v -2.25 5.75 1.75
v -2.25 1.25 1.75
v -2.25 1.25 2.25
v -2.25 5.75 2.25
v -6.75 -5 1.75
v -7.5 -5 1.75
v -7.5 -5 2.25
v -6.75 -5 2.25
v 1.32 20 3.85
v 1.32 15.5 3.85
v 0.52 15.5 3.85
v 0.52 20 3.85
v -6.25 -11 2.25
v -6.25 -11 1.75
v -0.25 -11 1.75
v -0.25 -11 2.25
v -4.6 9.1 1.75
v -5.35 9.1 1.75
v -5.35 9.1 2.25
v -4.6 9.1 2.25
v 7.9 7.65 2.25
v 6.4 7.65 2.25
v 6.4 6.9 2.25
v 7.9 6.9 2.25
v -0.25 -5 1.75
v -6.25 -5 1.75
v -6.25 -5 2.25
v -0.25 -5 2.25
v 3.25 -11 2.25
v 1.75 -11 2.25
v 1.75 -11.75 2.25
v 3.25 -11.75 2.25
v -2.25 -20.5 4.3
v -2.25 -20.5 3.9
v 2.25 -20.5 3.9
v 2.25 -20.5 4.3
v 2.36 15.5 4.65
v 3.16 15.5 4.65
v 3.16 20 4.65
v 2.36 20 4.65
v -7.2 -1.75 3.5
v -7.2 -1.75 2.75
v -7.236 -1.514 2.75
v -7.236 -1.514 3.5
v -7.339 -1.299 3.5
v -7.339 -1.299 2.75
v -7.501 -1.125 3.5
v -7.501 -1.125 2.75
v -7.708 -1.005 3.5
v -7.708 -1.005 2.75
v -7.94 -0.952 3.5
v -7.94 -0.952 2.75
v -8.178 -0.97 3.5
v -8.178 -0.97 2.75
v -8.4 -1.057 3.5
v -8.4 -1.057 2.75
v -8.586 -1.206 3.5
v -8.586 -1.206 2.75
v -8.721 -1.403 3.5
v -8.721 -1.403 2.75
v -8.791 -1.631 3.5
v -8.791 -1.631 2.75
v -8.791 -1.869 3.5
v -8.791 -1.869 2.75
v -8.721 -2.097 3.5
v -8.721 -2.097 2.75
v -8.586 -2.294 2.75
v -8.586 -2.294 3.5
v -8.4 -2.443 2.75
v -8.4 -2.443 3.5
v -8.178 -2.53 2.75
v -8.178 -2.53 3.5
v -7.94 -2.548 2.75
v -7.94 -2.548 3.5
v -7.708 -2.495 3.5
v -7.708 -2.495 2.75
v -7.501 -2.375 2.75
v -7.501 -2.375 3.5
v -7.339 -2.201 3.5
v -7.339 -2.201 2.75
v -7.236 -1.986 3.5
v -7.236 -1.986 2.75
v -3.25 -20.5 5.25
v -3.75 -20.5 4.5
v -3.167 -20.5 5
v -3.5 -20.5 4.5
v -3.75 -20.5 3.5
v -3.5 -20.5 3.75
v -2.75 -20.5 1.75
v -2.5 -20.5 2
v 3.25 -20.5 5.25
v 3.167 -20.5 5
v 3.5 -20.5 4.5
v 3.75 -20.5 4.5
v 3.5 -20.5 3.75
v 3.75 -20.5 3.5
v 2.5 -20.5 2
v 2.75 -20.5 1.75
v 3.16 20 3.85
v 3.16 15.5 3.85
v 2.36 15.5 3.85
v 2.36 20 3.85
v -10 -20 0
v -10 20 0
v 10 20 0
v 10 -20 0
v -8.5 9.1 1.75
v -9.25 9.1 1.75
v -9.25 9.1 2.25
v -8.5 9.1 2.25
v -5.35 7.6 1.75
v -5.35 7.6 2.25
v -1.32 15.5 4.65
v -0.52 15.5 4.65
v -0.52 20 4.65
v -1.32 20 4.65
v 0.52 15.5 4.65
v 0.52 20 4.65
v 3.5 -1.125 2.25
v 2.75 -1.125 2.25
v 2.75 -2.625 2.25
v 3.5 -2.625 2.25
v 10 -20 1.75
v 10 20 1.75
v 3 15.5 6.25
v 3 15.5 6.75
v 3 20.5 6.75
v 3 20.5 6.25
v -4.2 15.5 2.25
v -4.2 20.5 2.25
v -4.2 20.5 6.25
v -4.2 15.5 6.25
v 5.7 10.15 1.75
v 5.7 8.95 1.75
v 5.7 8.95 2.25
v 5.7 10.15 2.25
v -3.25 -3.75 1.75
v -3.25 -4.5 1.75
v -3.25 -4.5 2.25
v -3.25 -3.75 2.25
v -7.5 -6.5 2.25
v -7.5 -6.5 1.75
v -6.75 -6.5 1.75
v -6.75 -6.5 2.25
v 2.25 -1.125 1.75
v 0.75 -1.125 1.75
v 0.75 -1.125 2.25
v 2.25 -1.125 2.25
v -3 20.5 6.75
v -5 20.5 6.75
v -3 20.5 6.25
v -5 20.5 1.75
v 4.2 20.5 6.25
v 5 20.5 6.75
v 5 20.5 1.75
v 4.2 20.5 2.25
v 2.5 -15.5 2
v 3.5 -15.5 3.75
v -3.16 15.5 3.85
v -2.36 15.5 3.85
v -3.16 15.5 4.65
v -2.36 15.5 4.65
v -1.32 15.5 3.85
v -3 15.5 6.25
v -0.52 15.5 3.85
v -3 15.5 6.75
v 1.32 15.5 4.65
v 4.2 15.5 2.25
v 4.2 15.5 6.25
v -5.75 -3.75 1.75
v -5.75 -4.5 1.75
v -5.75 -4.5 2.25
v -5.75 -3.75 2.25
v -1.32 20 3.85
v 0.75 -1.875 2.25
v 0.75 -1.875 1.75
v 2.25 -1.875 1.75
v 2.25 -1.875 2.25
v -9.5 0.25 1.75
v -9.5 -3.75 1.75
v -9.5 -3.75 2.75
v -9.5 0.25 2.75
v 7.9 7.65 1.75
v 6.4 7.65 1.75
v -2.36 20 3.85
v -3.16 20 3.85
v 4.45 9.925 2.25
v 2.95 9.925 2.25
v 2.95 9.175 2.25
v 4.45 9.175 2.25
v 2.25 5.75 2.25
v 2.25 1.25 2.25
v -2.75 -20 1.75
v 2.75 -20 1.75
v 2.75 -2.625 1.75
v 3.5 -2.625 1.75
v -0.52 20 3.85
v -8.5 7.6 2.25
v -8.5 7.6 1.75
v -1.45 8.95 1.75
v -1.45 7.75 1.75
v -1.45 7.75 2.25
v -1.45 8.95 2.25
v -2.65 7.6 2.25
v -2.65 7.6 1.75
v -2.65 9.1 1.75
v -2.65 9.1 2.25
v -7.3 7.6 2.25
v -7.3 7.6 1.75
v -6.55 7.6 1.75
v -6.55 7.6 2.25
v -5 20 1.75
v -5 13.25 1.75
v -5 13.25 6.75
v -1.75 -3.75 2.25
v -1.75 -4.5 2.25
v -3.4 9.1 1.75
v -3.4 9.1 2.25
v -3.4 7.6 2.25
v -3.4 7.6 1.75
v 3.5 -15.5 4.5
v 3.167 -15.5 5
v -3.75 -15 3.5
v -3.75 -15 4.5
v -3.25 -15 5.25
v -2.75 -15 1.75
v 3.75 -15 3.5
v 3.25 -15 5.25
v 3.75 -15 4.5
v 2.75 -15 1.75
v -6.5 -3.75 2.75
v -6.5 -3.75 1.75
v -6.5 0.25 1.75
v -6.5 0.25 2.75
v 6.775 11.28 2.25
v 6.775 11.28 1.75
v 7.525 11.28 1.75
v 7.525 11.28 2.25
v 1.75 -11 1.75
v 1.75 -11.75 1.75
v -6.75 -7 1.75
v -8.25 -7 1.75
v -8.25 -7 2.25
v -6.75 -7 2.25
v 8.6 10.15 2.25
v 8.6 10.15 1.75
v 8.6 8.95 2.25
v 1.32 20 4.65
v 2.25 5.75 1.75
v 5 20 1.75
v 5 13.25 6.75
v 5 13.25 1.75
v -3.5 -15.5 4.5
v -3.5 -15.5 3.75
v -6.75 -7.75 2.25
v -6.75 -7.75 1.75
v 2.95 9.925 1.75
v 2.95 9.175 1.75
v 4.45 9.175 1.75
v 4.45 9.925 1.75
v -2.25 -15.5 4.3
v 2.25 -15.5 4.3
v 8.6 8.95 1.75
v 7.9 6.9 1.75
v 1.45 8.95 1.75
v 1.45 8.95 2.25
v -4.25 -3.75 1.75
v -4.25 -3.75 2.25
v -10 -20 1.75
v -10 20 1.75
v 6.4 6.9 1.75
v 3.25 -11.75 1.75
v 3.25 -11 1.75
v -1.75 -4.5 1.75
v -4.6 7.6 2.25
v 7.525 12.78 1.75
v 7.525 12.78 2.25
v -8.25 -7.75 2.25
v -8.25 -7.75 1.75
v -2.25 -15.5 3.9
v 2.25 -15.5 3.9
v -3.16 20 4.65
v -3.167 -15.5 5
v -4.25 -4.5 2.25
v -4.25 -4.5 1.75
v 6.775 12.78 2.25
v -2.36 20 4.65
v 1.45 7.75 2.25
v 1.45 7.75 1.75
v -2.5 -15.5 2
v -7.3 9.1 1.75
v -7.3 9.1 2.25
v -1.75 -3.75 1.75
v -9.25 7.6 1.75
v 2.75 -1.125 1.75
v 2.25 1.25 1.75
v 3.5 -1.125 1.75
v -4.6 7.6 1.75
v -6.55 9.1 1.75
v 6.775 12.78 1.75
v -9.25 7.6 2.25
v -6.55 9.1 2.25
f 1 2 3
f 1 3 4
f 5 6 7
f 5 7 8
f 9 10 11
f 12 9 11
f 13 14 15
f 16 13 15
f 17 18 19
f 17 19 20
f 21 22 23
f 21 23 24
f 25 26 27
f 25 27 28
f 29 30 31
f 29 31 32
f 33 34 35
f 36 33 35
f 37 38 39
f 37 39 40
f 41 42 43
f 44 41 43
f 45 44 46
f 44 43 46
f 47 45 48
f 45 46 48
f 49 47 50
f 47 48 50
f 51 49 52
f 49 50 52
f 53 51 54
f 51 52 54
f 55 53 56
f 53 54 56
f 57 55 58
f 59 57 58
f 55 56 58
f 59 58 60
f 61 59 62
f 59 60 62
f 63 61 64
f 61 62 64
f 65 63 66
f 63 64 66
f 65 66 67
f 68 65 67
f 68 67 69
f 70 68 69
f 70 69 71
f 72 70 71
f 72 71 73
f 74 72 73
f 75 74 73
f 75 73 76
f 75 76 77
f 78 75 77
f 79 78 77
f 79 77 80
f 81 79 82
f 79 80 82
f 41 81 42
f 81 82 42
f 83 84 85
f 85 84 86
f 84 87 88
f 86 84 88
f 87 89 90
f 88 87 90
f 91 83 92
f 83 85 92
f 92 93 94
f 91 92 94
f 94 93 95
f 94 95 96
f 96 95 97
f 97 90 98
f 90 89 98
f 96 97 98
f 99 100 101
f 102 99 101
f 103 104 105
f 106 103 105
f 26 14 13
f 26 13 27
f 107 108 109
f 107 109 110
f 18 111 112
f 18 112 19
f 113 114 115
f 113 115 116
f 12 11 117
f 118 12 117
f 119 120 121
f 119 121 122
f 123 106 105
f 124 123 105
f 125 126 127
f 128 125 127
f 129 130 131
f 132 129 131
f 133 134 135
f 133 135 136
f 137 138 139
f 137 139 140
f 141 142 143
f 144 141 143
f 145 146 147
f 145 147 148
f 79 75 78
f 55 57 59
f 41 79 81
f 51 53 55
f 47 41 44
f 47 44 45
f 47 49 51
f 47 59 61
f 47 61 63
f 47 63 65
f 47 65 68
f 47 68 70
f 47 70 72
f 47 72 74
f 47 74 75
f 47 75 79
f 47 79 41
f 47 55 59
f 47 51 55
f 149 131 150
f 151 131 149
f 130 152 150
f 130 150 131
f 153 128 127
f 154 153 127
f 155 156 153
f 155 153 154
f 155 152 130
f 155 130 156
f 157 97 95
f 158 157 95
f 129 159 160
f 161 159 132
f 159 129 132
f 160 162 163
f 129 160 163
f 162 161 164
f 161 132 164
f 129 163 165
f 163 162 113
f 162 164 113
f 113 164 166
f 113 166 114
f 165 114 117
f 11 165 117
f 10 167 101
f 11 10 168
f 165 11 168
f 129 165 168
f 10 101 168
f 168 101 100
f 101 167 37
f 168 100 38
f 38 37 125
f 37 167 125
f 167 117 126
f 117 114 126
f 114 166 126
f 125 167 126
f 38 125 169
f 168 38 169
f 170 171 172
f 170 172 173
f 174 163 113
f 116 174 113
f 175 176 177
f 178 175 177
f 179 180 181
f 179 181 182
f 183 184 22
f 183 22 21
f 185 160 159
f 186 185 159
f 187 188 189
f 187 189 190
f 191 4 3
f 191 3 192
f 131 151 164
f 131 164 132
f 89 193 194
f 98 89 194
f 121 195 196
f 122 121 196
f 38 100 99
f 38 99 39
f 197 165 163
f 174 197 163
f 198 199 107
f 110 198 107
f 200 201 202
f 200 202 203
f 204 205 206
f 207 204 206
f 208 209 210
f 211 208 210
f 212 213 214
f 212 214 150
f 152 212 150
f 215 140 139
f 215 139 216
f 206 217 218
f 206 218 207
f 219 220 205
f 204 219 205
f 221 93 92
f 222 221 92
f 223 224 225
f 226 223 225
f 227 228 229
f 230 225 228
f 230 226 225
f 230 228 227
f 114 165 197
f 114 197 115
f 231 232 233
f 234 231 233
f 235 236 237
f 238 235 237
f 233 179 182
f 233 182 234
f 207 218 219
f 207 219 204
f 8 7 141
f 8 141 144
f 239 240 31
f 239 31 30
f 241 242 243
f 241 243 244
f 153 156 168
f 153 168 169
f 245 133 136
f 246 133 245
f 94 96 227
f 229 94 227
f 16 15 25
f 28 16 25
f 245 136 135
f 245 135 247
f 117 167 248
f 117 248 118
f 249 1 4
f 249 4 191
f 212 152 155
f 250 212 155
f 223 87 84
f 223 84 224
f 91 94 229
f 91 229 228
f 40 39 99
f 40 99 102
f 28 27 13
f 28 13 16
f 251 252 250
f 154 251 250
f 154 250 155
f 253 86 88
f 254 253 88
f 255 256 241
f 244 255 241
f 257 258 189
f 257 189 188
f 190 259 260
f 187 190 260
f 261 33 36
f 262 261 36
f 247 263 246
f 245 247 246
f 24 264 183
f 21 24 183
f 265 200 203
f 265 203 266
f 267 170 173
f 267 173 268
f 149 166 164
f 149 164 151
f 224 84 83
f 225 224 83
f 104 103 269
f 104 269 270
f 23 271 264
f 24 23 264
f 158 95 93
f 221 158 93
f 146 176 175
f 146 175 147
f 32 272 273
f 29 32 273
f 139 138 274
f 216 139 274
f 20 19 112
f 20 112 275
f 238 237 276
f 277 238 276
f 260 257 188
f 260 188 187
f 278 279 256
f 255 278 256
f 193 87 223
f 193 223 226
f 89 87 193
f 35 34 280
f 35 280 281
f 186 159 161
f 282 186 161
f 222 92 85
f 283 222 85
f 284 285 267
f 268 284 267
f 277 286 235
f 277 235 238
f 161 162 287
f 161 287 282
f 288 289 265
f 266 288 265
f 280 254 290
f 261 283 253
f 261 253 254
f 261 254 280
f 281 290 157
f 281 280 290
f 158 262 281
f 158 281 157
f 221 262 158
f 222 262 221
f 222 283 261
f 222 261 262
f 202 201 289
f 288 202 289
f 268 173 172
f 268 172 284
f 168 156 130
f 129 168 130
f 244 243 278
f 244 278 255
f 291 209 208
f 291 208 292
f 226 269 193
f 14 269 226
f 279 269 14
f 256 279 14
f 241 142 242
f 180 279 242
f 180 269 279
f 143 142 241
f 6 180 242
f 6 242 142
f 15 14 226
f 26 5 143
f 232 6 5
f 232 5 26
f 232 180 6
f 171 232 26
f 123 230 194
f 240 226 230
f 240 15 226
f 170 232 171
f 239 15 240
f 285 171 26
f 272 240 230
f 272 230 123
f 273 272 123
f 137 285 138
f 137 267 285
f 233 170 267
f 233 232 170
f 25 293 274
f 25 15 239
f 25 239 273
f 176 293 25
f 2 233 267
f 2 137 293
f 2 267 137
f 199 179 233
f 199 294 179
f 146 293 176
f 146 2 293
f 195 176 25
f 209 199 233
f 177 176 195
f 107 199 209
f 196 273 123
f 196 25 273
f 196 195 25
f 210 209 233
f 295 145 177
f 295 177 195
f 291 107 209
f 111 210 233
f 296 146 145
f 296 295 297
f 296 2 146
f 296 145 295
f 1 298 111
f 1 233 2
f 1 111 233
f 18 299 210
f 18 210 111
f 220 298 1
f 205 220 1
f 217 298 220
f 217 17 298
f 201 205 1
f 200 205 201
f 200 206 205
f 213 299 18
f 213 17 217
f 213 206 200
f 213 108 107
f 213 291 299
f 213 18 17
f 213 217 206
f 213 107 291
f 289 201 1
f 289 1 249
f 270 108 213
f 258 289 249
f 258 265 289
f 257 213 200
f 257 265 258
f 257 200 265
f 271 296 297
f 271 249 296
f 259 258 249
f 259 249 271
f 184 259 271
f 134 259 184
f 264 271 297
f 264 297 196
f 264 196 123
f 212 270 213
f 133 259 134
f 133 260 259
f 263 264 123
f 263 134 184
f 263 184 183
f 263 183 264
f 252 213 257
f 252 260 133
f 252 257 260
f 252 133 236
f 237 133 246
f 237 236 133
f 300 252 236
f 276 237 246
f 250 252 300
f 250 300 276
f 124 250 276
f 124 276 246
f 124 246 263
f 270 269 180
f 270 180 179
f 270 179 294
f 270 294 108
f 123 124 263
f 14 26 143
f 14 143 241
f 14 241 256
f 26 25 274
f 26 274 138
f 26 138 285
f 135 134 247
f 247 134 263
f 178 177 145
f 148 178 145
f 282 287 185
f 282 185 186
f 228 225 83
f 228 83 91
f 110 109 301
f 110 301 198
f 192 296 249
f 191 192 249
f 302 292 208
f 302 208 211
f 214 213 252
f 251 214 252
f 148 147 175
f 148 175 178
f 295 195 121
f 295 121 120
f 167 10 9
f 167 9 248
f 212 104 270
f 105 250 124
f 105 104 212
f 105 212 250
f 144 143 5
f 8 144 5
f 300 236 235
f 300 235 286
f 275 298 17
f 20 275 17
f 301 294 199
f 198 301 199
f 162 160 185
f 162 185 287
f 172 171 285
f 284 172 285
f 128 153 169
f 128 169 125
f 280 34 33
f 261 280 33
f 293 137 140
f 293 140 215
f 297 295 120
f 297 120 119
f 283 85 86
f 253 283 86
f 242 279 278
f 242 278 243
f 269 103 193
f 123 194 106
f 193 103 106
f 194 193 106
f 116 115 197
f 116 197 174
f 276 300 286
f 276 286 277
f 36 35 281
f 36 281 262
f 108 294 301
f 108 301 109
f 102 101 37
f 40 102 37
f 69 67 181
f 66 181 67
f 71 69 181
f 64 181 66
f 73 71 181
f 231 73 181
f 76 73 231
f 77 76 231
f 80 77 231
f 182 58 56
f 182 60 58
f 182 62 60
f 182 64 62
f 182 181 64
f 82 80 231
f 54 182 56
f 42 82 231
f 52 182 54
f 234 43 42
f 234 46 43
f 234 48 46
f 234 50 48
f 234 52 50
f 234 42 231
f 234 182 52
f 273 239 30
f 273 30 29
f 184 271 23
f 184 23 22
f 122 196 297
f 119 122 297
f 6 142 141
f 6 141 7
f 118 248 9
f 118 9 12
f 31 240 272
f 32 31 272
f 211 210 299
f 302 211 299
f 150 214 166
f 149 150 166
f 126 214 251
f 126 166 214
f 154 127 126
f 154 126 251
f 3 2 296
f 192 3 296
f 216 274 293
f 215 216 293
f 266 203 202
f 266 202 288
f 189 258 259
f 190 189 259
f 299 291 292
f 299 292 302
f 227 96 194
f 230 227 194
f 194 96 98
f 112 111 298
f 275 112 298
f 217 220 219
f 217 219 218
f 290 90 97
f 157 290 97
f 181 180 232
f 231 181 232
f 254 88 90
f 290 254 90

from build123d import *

# Parameters (mm, degrees)
SKETCH_W        = 20
SKETCH_H        = 40
PAD_DEPTH       = 1.75
SKETCH001_W     = 7.5
SKETCH001_H     = 5.5
PAD001_DEPTH    = 3.5
POCKET_DEPTH    = 5.5
SKETCH003_W     = 4.5
SKETCH003_H     = 0.4
POCKET001_DEPTH = 5
SKETCH004_W     = 10
SKETCH004_H     = 7.25
PAD002_DEPTH    = 5
SKETCH005_W     = 8.4
SKETCH005_H     = 4
POCKET002_DEPTH = 5
SKETCH006_W     = 0.8
SKETCH006_H     = 0.8
PAD003_DEPTH    = 4.5
SKETCH007_W     = 6
SKETCH007_H     = 6
SKETCH007_W_2   = 4.5
SKETCH007_H_2   = 4.5
SKETCH007_W_3   = 0.75
SKETCH007_H_3   = 1.5
SKETCH007_W_4   = 2.9
SKETCH007_H_4   = 1.2
SKETCH007_W_5   = 1.5
SKETCH007_H_5   = 0.75
PAD004_DEPTH    = 0.5
SKETCH008_W     = 3
SKETCH008_H     = 4
PAD005_DEPTH    = 1
SKETCH009_R     = 0.8
PAD006_DEPTH    = 0.75
SKETCH010_W     = 6
SKETCH010_H     = 5
POCKET003_DEPTH = 0.5


with BuildPart() as part:
    # Sketch → Pad (new body)
    with BuildSketch(Plane.XY):
        Rectangle(SKETCH_W, SKETCH_H)
    extrude(amount=PAD_DEPTH)

    # Sketch001 (on Face6 of Pad) → Pad001 (join)
    with BuildSketch(Plane.XY.offset(1.75)):
        with Locations((0, -17.75)):
            Rectangle(SKETCH001_W, SKETCH001_H)
    extrude(amount=PAD001_DEPTH)

    # Sketch002 (on Face11 of Pad001) → Pocket (cut)
    with BuildSketch(Plane.XZ.offset(20.5)):
        Polygon((-3.75, 5.25), (-3.75, 4.5), (-3.25, 5.25), align=None)
        Polygon((-3.75, 1.75), (-3.75, 3.5), (-2.75, 1.75), align=None)
    pocket = extrude(amount=-POCKET_DEPTH, mode=Mode.SUBTRACT)

    # Mirrored: Pocket across YZ
    add(pocket.mirror(Plane.YZ), mode=Mode.SUBTRACT)

    # Sketch003 (on Face10 of Mirrored) → Pocket001 (cut)
    with BuildSketch(Plane.XZ.offset(20.5)):
        Polygon((-3.166667, 5), (-3.5, 4.5), (-3.5, 3.75), (-2.5, 2), (2.5, 2), (3.5, 3.75), (3.5, 4.5), (3.166667, 5), align=None)
        with Locations((0, 4.1)):
            Rectangle(SKETCH003_W, SKETCH003_H, mode=Mode.SUBTRACT)
    extrude(amount=-POCKET001_DEPTH, mode=Mode.SUBTRACT)

    # Sketch004 (on Face5 of Pocket001) → Pad002 (join)
    with BuildSketch(Plane.XY.offset(1.75)):
        with Locations((0, 16.875)):
            Rectangle(SKETCH004_W, SKETCH004_H)
    extrude(amount=PAD002_DEPTH)

    # Sketch005 (on Face15 of Pad002) → Pocket002 (cut)
    with BuildSketch(Plane(origin=(0, 20.5, 0), x_dir=(-1, 0, 0), z_dir=(0, 1, 0))):
        with Locations((0, 4.25)):
            Rectangle(SKETCH005_W, SKETCH005_H)
    extrude(amount=-POCKET002_DEPTH, mode=Mode.SUBTRACT)

    # Sketch006 (on Face35 of Pocket002) → Pad003 (join)
    with BuildSketch(Plane(origin=(0, 15.5, 0), x_dir=(-1, 0, 0), z_dir=(0, 1, 0))):
        with Locations((-2.76, 4.25)):
            Rectangle(SKETCH006_W, SKETCH006_H)
        with Locations((-0.92, 4.25)):
            Rectangle(SKETCH006_W, SKETCH006_H)
        with Locations((0.92, 4.25)):
            Rectangle(SKETCH006_W, SKETCH006_H)
        with Locations((2.76, 4.25)):
            Rectangle(SKETCH006_W, SKETCH006_H)
    extrude(amount=PAD003_DEPTH)

    # Sketch007 (on Face5 of Pad003) → Pad004 (join)
    with BuildSketch(Plane.XY.offset(1.75)):
        with Locations((-3.25, -8)):
            Rectangle(SKETCH007_W, SKETCH007_H)
        with Locations((0, 3.5)):
            Rectangle(SKETCH007_W_2, SKETCH007_H_2)
        with Locations((-8.875, 8.35)):
            Rectangle(SKETCH007_W_3, SKETCH007_H_3)
        with Locations((-6.925, 8.35)):
            Rectangle(SKETCH007_W_3, SKETCH007_H_3)
        with Locations((-4.975, 8.35)):
            Rectangle(SKETCH007_W_3, SKETCH007_H_3)
        with Locations((-3.025, 8.35)):
            Rectangle(SKETCH007_W_3, SKETCH007_H_3)
        with Locations((0, 8.35)):
            Rectangle(SKETCH007_W_4, SKETCH007_H_4)
        with Locations((3.7, 9.55)):
            Rectangle(SKETCH007_W_5, SKETCH007_H_5)
        with Locations((7.15, 9.55)):
            Rectangle(SKETCH007_W_4, SKETCH007_H_4)
        with Locations((7.15, 12.03)):
            Rectangle(SKETCH007_W_3, SKETCH007_H_3)
        with Locations((7.15, 7.275)):
            Rectangle(SKETCH007_W_5, SKETCH007_H_5)
        with Locations((-5, -4.125)):
            Rectangle(SKETCH007_W_5, SKETCH007_H_5)
        with Locations((-2.5, -4.125)):
            Rectangle(SKETCH007_W_5, SKETCH007_H_5)
        with Locations((2.5, -11.375)):
            Rectangle(SKETCH007_W_5, SKETCH007_H_5)
        with Locations((-7.125, -5.75)):
            Rectangle(SKETCH007_W_3, SKETCH007_H_3)
        with Locations((-7.5, -7.375)):
            Rectangle(SKETCH007_W_5, SKETCH007_H_5)
        with Locations((1.5, -1.5)):
            Rectangle(SKETCH007_W_5, SKETCH007_H_5)
        with Locations((3.125, -1.875)):
            Rectangle(SKETCH007_W_3, SKETCH007_H_3)
    extrude(amount=PAD004_DEPTH)

    # Sketch008 (on Face5 of Pad004) → Pad005 (join)
    with BuildSketch(Plane.XY.offset(1.75)):
        with Locations((-8, -1.75)):
            Rectangle(SKETCH008_W, SKETCH008_H)
    extrude(amount=PAD005_DEPTH)

    # Sketch009 (on Face103 of Pad005) → Pad006 (join)
    with BuildSketch(Plane.XY.offset(2.75)):
        with Locations((-8, -1.75)):
            Circle(SKETCH009_R)
    extrude(amount=PAD006_DEPTH)

    # Sketch010 (on Face94 of Pad006) → Pocket003 (cut)
    with BuildSketch(Plane.XY.offset(6.75)):
        with Locations((0, 18)):
            Rectangle(SKETCH010_W, SKETCH010_H)
    extrude(amount=-POCKET003_DEPTH, mode=Mode.SUBTRACT)


solid = part.part
